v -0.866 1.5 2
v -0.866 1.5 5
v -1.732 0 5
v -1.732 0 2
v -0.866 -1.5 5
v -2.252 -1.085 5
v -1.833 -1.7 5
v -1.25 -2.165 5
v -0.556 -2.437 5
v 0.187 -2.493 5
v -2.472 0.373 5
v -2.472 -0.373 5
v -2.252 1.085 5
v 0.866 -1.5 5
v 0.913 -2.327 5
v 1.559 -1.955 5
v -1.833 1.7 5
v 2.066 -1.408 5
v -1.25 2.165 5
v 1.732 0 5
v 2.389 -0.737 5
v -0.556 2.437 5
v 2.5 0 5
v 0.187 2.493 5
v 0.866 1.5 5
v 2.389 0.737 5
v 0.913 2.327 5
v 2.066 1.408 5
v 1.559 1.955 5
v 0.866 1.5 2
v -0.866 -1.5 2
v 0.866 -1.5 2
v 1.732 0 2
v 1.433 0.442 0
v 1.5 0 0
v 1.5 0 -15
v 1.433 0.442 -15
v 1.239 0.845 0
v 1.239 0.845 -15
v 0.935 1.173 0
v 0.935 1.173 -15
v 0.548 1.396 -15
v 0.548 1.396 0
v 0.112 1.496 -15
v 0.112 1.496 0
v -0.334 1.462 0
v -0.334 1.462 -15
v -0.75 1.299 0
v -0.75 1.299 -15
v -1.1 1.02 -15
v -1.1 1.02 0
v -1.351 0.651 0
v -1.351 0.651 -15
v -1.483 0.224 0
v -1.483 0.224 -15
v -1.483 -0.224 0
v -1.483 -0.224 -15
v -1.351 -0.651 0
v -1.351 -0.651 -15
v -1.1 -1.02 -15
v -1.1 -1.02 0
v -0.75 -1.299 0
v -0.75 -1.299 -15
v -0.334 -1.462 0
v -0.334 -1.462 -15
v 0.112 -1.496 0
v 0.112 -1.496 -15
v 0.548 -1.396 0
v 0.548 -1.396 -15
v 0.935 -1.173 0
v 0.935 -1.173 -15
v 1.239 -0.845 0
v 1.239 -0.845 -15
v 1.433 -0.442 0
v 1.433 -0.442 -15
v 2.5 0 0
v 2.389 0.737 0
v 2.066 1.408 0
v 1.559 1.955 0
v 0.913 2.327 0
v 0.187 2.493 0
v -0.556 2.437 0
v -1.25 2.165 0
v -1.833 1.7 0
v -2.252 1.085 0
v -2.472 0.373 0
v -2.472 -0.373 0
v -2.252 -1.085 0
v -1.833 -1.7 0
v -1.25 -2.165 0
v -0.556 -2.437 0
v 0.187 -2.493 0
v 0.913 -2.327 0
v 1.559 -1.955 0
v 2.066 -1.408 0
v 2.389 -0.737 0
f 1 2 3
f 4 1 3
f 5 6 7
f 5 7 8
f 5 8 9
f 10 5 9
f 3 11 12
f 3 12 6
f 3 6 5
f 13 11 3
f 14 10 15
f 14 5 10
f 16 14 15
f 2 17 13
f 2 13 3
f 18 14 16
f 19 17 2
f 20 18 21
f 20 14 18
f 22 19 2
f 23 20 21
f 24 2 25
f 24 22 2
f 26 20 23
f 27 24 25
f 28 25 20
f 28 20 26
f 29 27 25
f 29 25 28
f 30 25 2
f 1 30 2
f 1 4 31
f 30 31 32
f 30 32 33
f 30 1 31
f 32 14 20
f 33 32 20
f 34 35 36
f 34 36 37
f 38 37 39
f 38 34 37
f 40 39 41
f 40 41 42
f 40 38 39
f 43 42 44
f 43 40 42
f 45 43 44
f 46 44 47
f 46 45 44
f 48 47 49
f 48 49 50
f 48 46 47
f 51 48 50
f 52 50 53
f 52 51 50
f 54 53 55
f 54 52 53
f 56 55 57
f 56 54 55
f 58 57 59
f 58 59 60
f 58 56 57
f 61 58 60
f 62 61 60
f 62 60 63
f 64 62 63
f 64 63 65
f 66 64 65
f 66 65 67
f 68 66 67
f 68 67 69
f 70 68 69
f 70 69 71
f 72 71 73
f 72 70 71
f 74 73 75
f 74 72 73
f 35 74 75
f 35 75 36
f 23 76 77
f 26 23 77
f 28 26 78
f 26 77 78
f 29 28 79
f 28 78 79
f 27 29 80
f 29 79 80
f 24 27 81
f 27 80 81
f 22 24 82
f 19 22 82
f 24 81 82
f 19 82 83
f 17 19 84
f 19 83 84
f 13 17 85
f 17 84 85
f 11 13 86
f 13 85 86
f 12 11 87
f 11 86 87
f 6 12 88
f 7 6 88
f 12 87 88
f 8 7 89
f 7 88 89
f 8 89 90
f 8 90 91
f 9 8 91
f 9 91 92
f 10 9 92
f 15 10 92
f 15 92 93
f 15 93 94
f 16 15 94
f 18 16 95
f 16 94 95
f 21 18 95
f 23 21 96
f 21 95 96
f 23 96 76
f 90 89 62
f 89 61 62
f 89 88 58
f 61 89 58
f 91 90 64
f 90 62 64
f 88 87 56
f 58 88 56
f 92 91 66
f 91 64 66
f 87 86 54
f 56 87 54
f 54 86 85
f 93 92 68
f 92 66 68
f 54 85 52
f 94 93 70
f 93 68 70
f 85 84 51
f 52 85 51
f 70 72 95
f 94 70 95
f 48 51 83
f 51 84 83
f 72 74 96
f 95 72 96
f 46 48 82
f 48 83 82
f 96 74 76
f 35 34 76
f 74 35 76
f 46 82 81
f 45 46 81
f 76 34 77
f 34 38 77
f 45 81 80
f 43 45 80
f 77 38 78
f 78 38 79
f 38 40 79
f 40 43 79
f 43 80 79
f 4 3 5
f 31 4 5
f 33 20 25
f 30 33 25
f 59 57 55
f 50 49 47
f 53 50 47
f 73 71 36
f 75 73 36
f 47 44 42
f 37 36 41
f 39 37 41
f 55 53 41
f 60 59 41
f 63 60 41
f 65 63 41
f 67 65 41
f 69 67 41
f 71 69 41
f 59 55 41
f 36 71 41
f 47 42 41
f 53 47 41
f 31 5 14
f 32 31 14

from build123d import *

# Parameters (mm, degrees)
F0_R     = 1.5
F1_DEPTH = 15
F2_R     = 2.5
F2_R_2   = 1.5
F3_DEPTH = 5
F5_DEPTH = 3


with BuildPart() as f1:
    # F0 (on Top) → F1 (new body)
    with BuildSketch(Plane.XY):
        Circle(F0_R)
    extrude(amount=-F1_DEPTH)

    # F2 (on face) → F3 (join)
    with BuildSketch(Plane.XY):
        Circle(F2_R)
        Circle(F2_R_2, mode=Mode.SUBTRACT)
        Circle(F2_R_2)
    extrude(amount=F3_DEPTH)

    # F4 (on face) → F5 (cut)
    with BuildSketch(Plane.XY.offset(5)):
        Polygon((-0.866025, 1.5), (-1.732051, 0), (-0.866025, -1.5), (0.866025, -1.5), (1.732051, 0), (0.866025, 1.5), align=None)
    extrude(amount=-F5_DEPTH, mode=Mode.SUBTRACT)


solid = f1.part
